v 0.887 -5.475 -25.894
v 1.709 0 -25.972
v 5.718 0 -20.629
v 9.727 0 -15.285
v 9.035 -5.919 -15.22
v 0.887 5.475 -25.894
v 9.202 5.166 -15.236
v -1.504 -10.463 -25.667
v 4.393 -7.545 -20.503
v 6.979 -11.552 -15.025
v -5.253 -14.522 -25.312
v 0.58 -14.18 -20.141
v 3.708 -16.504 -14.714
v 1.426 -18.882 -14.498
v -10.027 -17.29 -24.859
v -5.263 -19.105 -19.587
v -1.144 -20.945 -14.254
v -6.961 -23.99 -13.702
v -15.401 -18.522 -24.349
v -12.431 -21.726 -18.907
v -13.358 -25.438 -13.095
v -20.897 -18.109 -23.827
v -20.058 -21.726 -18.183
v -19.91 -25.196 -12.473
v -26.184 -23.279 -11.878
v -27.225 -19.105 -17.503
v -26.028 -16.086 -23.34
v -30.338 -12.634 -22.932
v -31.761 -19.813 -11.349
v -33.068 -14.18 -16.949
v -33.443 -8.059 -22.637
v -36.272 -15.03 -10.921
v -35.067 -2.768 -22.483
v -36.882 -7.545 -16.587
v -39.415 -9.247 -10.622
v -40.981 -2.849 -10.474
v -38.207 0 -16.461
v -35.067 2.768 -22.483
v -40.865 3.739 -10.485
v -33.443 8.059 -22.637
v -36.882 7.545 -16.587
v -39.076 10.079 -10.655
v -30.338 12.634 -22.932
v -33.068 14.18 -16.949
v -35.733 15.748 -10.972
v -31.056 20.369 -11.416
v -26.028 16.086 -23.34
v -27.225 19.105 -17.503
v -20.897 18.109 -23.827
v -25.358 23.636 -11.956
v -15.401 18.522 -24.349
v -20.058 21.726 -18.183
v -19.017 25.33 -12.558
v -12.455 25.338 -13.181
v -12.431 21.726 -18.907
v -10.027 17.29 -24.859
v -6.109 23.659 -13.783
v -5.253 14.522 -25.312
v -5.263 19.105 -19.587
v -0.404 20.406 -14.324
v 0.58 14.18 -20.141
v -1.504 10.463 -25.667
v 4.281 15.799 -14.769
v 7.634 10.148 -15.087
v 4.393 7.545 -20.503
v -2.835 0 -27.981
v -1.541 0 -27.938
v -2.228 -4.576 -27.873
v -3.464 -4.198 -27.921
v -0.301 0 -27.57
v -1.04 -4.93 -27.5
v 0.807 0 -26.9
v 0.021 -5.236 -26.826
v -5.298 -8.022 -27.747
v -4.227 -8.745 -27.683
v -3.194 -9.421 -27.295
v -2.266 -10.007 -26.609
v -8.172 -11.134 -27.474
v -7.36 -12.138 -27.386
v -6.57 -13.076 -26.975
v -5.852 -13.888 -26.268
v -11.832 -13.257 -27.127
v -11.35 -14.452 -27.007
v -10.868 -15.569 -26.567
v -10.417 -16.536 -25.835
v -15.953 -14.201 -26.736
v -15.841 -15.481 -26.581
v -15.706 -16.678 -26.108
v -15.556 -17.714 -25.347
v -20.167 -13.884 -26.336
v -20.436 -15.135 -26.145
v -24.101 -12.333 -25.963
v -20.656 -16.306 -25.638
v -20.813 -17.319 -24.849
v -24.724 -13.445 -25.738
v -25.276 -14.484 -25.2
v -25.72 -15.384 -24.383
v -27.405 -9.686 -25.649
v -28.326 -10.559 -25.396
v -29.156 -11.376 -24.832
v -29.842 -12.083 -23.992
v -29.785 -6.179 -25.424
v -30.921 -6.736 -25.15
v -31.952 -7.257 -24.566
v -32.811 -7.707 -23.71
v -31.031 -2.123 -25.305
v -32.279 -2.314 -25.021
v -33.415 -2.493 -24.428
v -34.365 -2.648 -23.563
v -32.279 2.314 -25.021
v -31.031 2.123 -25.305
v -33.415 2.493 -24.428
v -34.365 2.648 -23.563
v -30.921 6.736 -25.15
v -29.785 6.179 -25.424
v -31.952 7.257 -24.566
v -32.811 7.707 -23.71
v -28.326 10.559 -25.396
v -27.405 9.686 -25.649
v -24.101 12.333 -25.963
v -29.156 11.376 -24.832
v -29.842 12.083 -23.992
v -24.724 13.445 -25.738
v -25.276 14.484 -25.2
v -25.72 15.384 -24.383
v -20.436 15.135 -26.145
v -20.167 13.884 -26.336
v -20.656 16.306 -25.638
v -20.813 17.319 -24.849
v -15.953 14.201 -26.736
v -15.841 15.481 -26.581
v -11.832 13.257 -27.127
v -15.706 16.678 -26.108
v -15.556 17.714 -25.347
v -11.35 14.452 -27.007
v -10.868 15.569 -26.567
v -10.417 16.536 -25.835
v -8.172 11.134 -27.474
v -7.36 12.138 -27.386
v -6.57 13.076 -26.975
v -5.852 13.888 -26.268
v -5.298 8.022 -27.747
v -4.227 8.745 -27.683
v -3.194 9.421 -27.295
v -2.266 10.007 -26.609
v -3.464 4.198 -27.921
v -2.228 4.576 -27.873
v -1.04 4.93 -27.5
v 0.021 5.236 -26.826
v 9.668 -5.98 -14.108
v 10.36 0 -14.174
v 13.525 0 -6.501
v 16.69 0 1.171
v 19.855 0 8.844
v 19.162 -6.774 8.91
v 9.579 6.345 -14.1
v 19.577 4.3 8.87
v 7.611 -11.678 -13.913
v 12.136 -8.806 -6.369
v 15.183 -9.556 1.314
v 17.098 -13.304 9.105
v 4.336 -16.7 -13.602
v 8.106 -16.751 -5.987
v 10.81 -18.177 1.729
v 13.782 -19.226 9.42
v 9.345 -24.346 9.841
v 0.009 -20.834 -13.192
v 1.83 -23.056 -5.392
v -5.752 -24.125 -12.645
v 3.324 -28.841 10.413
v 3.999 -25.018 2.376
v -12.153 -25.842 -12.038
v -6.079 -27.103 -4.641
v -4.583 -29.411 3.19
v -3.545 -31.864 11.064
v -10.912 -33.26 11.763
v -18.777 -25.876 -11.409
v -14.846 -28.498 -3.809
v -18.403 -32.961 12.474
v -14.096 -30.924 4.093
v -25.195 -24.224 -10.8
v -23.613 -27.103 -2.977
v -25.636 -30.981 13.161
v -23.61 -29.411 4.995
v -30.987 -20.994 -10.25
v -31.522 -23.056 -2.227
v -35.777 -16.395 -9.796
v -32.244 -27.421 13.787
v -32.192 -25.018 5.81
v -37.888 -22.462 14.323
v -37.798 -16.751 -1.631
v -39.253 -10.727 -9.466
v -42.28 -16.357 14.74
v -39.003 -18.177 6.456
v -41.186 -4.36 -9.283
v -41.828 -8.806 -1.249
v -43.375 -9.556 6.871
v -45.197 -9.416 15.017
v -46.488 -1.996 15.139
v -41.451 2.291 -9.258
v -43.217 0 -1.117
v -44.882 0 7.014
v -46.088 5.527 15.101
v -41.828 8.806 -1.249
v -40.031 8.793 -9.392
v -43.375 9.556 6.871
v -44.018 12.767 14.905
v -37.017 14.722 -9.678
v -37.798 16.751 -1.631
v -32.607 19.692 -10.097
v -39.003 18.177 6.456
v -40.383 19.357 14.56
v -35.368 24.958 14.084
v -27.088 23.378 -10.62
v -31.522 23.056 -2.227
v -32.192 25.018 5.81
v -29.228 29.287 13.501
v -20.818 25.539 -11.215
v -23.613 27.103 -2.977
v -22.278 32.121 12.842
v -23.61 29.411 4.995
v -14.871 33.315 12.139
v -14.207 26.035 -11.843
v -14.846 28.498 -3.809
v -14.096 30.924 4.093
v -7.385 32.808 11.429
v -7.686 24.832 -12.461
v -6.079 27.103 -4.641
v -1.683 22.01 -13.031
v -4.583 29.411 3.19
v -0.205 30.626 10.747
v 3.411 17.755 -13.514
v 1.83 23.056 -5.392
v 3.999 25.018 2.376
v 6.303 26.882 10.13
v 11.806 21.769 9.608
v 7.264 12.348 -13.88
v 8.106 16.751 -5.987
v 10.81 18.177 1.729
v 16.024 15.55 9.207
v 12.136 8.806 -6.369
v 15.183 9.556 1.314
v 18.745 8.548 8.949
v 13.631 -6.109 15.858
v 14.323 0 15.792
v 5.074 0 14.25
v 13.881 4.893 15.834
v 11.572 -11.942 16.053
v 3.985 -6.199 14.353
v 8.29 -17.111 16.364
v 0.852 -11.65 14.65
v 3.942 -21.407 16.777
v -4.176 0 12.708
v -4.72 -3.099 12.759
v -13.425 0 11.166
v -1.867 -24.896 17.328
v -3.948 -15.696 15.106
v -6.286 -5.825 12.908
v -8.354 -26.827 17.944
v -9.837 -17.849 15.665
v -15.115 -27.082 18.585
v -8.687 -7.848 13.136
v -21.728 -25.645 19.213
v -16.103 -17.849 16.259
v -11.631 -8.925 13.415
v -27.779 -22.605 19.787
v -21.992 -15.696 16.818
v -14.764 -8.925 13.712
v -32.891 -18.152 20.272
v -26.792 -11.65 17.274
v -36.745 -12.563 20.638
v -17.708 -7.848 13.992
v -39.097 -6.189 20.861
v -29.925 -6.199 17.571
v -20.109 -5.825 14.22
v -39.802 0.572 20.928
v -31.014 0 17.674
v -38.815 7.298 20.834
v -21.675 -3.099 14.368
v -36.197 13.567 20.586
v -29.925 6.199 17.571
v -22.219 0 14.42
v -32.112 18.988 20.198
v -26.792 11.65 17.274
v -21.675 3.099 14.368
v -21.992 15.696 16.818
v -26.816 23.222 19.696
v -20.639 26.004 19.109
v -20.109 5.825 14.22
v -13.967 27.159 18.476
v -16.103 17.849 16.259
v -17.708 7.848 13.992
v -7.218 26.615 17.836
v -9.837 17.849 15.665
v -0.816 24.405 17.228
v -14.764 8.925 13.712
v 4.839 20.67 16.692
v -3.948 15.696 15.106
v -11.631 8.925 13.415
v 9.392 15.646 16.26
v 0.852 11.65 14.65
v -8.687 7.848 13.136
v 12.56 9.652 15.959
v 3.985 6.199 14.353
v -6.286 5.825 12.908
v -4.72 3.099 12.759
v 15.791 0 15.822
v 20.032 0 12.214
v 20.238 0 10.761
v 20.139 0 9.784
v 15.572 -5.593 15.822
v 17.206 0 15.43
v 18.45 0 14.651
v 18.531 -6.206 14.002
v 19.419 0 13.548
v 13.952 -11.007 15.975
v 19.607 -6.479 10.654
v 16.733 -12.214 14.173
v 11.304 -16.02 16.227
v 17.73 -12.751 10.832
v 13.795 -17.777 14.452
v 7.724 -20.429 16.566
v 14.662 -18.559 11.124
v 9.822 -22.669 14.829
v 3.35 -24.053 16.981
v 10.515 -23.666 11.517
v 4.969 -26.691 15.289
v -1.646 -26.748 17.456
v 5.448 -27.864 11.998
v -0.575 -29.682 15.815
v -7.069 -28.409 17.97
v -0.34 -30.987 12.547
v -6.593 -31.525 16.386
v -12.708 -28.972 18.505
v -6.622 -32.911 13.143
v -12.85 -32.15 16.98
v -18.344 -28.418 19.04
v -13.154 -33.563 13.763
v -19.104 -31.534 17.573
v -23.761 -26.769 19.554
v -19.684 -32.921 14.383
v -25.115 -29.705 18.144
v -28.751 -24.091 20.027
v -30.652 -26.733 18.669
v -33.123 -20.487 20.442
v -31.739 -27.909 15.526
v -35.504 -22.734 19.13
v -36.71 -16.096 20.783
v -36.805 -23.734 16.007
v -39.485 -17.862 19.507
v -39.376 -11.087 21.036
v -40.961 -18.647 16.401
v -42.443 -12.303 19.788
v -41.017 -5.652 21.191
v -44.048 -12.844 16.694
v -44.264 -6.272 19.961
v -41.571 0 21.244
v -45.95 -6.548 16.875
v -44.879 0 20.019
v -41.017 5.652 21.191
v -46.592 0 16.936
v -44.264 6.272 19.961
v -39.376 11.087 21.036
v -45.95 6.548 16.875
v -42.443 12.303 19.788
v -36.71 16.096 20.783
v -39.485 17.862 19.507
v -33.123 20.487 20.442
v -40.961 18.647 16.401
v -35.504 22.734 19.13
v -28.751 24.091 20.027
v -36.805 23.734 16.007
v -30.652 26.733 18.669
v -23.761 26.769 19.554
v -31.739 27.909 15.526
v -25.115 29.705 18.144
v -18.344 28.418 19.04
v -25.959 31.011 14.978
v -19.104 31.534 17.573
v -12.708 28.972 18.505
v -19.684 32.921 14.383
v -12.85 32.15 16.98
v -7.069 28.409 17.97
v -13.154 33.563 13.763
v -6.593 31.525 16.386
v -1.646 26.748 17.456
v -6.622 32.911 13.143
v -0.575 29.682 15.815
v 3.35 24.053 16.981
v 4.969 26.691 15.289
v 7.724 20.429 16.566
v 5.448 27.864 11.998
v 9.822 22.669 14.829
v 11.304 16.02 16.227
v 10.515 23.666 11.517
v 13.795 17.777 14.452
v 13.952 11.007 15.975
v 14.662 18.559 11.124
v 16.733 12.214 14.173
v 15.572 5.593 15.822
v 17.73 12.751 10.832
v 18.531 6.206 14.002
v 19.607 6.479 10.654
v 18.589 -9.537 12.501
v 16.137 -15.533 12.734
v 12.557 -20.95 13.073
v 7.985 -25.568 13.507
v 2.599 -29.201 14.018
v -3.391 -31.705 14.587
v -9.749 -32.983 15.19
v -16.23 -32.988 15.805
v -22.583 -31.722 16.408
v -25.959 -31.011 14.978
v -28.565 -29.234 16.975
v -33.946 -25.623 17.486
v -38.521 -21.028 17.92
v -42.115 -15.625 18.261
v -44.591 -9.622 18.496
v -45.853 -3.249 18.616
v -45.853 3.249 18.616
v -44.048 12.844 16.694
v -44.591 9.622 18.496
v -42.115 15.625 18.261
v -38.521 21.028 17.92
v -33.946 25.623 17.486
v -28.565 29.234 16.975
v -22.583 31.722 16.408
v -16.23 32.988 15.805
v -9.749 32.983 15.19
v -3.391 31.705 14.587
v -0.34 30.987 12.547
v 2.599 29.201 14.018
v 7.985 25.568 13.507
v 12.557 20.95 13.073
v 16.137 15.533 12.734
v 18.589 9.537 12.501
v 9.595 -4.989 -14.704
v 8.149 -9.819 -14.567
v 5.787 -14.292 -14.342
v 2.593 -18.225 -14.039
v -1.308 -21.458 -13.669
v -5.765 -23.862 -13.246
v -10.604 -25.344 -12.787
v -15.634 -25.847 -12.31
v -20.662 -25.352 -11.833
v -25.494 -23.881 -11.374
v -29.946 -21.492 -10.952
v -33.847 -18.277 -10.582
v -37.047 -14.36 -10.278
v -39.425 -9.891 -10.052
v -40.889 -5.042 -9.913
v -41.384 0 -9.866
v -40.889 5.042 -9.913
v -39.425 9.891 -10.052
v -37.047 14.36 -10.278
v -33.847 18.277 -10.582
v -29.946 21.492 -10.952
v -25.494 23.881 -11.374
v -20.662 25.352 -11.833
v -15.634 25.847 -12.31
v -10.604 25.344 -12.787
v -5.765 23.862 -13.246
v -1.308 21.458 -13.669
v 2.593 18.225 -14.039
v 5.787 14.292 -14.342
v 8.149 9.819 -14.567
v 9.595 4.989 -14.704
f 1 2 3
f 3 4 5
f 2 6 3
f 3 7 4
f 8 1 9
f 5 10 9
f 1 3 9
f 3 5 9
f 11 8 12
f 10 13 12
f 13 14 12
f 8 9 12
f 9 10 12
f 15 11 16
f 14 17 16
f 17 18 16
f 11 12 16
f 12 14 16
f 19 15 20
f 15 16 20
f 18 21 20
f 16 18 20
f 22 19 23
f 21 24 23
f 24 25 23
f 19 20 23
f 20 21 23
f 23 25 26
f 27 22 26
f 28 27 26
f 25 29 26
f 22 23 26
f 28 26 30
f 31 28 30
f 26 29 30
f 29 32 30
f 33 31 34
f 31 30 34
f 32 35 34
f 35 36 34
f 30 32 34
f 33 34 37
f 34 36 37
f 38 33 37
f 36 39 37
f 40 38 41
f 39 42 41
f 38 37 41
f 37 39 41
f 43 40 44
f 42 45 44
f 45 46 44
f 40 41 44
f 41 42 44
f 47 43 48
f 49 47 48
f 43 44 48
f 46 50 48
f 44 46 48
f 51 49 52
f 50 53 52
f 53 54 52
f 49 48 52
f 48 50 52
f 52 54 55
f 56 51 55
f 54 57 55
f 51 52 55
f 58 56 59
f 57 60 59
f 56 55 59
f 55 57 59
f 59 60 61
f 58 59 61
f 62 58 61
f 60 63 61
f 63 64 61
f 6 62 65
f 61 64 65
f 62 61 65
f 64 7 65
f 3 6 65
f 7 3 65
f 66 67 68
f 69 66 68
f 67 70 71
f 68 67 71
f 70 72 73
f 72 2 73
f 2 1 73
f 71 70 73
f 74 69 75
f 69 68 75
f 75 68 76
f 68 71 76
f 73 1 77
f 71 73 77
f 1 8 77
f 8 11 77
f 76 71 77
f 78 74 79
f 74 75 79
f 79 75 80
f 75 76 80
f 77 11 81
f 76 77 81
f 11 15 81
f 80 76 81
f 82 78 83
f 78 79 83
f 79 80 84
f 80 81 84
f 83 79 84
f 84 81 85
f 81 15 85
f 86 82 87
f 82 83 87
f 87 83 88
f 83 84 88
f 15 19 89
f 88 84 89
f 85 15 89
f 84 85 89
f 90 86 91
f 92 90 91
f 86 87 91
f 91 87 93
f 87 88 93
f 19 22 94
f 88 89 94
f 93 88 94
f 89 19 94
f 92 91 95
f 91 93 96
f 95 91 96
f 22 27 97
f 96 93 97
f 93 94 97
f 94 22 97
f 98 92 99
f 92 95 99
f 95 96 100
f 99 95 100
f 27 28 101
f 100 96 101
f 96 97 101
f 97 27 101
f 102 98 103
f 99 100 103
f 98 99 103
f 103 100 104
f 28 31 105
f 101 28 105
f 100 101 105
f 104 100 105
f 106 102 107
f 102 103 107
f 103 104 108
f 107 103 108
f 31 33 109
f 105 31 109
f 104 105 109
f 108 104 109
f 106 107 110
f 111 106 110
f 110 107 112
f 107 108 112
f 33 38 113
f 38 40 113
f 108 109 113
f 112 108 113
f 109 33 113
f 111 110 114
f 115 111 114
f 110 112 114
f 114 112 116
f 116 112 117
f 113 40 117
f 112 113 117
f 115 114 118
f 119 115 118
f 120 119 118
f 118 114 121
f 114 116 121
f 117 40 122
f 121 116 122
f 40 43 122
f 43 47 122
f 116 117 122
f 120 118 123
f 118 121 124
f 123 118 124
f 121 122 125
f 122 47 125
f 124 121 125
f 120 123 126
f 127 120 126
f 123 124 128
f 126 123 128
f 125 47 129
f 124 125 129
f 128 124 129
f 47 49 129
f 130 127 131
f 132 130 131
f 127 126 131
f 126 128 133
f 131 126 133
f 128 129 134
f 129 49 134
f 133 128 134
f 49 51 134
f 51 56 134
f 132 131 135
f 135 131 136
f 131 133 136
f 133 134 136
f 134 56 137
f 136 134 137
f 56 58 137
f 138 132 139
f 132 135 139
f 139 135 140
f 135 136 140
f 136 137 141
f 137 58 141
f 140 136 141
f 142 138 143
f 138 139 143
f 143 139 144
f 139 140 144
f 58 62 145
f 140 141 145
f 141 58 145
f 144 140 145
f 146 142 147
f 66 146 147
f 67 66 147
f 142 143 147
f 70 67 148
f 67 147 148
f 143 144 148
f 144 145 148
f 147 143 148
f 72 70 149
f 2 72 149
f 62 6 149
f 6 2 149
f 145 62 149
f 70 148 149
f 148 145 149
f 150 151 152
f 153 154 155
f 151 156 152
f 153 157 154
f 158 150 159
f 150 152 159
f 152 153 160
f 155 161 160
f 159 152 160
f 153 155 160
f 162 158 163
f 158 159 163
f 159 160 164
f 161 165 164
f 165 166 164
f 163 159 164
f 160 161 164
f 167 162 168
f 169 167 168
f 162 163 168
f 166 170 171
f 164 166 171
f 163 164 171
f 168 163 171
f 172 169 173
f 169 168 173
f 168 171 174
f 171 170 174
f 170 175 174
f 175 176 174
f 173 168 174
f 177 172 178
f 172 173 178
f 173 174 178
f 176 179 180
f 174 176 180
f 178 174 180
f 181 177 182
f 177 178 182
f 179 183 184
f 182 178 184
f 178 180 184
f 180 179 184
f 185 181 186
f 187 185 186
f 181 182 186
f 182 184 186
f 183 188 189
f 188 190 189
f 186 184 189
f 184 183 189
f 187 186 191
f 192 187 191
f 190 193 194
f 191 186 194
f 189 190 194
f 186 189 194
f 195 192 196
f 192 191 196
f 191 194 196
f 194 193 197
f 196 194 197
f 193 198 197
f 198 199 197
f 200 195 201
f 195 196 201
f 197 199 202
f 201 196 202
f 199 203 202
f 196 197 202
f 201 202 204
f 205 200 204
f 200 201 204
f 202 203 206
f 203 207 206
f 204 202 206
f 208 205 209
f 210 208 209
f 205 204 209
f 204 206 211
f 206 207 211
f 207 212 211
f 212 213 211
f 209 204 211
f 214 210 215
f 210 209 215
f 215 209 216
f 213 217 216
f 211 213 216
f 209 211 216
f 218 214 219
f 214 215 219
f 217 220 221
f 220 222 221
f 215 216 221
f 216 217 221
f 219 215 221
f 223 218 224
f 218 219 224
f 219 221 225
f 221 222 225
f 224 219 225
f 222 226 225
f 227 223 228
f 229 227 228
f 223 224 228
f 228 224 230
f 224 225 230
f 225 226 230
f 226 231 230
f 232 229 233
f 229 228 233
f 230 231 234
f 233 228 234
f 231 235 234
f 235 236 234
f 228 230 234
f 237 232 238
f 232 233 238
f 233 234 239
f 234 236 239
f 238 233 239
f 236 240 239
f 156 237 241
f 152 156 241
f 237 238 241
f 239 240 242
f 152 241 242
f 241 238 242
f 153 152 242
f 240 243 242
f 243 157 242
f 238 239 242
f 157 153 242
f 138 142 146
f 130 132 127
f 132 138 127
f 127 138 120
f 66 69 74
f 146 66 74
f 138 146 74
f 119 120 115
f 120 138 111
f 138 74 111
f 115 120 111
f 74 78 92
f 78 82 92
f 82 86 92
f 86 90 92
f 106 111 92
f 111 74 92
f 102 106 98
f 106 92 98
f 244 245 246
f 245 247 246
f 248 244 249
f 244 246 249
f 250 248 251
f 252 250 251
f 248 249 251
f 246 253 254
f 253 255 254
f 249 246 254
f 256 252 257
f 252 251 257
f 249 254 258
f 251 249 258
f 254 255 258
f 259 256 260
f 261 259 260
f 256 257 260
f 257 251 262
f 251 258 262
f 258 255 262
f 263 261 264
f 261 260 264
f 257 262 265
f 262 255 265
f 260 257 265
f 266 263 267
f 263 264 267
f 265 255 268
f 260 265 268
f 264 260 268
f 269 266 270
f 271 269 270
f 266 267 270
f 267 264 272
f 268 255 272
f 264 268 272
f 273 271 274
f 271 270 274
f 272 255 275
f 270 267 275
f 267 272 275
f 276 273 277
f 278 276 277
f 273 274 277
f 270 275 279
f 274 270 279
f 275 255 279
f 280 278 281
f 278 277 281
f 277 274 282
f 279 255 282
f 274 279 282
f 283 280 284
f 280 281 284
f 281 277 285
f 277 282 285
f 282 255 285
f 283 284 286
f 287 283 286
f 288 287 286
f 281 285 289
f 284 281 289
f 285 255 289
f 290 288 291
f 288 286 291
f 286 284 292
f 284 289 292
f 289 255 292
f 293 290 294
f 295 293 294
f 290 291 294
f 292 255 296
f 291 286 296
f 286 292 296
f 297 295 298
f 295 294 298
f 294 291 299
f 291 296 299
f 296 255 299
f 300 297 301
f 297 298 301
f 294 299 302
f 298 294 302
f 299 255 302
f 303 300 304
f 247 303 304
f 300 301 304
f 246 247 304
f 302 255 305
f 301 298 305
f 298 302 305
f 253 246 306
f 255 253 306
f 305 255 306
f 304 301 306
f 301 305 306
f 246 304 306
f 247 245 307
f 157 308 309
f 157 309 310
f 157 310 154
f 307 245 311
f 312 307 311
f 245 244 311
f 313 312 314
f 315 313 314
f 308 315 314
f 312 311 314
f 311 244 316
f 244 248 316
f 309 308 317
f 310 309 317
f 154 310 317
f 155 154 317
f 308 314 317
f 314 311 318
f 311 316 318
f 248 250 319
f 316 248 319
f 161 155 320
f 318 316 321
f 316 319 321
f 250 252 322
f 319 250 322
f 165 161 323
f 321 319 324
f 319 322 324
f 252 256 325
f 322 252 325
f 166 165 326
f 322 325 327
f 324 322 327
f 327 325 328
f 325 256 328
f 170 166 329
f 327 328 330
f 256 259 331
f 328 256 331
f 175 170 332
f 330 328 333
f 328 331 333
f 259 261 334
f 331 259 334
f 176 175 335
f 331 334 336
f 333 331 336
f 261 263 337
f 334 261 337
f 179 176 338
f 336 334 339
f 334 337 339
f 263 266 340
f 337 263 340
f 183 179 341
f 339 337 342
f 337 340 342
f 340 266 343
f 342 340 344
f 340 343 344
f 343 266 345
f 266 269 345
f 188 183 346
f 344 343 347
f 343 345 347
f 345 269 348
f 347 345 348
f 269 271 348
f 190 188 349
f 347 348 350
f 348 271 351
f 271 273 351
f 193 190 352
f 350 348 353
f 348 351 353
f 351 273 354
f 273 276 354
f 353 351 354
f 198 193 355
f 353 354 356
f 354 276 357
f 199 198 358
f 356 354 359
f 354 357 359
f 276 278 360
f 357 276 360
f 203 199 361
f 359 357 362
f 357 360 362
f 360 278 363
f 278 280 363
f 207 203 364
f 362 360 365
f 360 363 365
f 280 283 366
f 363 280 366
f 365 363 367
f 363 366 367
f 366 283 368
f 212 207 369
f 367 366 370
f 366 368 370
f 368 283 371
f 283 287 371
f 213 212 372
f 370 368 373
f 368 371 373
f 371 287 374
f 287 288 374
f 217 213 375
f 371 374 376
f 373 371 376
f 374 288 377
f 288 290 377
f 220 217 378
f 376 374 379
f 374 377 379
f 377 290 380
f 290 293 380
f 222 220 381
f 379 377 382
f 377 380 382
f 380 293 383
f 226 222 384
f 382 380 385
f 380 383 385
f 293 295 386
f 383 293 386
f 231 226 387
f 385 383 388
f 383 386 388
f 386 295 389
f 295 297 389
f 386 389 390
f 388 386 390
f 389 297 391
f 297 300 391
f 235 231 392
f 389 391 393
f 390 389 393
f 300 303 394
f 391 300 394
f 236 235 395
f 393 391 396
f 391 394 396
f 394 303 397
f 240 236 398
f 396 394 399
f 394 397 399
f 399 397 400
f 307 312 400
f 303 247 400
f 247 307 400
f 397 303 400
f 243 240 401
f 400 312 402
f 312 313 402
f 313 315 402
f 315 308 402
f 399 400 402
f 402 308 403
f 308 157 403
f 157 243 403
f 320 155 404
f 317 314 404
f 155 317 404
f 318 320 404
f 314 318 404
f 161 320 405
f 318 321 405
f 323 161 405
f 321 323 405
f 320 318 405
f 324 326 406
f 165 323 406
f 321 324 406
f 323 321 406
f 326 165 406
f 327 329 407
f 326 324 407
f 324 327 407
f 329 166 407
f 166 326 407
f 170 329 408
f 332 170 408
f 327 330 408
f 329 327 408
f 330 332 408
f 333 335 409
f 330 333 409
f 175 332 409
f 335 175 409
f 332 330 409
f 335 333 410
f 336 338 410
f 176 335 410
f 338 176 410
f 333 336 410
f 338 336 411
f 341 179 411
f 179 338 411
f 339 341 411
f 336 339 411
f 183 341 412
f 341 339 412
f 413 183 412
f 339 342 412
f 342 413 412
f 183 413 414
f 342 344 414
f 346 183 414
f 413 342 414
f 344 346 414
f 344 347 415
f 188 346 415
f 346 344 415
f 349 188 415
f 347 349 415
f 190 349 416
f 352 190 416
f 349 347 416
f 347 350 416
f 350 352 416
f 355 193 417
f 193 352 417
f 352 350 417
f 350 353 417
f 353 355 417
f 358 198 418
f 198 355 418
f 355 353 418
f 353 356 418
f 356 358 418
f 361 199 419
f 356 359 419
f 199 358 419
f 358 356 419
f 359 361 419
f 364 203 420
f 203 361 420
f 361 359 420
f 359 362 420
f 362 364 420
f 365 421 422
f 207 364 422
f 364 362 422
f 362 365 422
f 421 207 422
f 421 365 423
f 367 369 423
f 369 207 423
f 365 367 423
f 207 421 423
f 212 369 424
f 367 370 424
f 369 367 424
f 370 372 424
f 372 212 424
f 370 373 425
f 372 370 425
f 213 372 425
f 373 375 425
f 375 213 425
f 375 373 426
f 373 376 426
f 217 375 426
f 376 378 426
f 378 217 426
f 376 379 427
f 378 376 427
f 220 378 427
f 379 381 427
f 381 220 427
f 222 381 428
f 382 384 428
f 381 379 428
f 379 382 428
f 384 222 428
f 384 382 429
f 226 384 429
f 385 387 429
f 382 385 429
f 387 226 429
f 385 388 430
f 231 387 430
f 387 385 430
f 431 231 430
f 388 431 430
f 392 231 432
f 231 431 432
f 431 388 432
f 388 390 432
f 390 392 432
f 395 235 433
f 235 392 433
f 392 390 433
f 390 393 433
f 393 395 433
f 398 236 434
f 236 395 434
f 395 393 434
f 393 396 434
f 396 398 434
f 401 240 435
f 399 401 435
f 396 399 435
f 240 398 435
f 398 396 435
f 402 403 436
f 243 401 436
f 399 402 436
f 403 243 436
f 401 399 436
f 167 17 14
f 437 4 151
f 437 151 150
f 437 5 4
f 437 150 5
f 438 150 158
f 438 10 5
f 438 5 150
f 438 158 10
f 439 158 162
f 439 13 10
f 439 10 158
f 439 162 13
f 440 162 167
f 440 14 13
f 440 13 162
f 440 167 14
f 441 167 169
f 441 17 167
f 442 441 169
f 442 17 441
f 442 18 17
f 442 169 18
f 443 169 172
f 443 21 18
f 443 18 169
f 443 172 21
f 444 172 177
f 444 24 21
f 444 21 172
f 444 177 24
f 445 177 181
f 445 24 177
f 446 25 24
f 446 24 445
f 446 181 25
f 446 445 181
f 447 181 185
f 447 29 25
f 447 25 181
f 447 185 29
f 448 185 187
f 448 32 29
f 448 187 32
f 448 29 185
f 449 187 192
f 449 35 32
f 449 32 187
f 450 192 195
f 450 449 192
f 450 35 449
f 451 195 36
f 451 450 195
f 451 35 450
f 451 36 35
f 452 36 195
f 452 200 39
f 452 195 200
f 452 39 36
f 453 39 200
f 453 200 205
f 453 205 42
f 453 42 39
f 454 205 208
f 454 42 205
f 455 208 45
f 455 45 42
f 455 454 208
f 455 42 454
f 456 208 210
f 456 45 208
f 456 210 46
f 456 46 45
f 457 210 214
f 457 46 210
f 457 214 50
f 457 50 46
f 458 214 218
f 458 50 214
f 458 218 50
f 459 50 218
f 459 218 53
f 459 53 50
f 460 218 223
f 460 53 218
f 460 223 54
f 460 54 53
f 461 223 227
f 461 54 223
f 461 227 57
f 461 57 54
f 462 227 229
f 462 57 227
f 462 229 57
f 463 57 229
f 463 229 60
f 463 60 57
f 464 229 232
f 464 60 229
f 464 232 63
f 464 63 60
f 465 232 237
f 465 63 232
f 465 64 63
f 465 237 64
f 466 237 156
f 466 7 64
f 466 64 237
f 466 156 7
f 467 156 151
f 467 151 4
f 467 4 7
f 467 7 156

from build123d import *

# Parameters (mm, degrees)
F2_R = 5.08


with BuildPart() as f1:
    # F0 (on Front) → F1 (revolve)
    with BuildSketch(Plane.XZ):
        Polygon((23.340716958, 17.2953996807), (-13.42510432, 11.1656589434), (-17.0120093971, -26.6356188804), (0, -28.2498622709), (10.1139964536, -14.769744128), align=None)
    revolve(axis=Axis((-15.2185568586, 0, -7.7349799685), (-0.0944641449, 0, -0.9955282645)))

    # F2
    f2_edges = [f1.edges().sort_by_distance(p)[0] for p in [
        (-34.024019, 0, -25.021375),
        (-41.422124, 0, -9.879561),
        (5.056998, 0, -21.509803),
        (-48.381865, 0, 24.101045),
        (16.727357, 0, 1.262828),
    ]]
    fillet(f2_edges, radius=F2_R)


solid = f1.part
